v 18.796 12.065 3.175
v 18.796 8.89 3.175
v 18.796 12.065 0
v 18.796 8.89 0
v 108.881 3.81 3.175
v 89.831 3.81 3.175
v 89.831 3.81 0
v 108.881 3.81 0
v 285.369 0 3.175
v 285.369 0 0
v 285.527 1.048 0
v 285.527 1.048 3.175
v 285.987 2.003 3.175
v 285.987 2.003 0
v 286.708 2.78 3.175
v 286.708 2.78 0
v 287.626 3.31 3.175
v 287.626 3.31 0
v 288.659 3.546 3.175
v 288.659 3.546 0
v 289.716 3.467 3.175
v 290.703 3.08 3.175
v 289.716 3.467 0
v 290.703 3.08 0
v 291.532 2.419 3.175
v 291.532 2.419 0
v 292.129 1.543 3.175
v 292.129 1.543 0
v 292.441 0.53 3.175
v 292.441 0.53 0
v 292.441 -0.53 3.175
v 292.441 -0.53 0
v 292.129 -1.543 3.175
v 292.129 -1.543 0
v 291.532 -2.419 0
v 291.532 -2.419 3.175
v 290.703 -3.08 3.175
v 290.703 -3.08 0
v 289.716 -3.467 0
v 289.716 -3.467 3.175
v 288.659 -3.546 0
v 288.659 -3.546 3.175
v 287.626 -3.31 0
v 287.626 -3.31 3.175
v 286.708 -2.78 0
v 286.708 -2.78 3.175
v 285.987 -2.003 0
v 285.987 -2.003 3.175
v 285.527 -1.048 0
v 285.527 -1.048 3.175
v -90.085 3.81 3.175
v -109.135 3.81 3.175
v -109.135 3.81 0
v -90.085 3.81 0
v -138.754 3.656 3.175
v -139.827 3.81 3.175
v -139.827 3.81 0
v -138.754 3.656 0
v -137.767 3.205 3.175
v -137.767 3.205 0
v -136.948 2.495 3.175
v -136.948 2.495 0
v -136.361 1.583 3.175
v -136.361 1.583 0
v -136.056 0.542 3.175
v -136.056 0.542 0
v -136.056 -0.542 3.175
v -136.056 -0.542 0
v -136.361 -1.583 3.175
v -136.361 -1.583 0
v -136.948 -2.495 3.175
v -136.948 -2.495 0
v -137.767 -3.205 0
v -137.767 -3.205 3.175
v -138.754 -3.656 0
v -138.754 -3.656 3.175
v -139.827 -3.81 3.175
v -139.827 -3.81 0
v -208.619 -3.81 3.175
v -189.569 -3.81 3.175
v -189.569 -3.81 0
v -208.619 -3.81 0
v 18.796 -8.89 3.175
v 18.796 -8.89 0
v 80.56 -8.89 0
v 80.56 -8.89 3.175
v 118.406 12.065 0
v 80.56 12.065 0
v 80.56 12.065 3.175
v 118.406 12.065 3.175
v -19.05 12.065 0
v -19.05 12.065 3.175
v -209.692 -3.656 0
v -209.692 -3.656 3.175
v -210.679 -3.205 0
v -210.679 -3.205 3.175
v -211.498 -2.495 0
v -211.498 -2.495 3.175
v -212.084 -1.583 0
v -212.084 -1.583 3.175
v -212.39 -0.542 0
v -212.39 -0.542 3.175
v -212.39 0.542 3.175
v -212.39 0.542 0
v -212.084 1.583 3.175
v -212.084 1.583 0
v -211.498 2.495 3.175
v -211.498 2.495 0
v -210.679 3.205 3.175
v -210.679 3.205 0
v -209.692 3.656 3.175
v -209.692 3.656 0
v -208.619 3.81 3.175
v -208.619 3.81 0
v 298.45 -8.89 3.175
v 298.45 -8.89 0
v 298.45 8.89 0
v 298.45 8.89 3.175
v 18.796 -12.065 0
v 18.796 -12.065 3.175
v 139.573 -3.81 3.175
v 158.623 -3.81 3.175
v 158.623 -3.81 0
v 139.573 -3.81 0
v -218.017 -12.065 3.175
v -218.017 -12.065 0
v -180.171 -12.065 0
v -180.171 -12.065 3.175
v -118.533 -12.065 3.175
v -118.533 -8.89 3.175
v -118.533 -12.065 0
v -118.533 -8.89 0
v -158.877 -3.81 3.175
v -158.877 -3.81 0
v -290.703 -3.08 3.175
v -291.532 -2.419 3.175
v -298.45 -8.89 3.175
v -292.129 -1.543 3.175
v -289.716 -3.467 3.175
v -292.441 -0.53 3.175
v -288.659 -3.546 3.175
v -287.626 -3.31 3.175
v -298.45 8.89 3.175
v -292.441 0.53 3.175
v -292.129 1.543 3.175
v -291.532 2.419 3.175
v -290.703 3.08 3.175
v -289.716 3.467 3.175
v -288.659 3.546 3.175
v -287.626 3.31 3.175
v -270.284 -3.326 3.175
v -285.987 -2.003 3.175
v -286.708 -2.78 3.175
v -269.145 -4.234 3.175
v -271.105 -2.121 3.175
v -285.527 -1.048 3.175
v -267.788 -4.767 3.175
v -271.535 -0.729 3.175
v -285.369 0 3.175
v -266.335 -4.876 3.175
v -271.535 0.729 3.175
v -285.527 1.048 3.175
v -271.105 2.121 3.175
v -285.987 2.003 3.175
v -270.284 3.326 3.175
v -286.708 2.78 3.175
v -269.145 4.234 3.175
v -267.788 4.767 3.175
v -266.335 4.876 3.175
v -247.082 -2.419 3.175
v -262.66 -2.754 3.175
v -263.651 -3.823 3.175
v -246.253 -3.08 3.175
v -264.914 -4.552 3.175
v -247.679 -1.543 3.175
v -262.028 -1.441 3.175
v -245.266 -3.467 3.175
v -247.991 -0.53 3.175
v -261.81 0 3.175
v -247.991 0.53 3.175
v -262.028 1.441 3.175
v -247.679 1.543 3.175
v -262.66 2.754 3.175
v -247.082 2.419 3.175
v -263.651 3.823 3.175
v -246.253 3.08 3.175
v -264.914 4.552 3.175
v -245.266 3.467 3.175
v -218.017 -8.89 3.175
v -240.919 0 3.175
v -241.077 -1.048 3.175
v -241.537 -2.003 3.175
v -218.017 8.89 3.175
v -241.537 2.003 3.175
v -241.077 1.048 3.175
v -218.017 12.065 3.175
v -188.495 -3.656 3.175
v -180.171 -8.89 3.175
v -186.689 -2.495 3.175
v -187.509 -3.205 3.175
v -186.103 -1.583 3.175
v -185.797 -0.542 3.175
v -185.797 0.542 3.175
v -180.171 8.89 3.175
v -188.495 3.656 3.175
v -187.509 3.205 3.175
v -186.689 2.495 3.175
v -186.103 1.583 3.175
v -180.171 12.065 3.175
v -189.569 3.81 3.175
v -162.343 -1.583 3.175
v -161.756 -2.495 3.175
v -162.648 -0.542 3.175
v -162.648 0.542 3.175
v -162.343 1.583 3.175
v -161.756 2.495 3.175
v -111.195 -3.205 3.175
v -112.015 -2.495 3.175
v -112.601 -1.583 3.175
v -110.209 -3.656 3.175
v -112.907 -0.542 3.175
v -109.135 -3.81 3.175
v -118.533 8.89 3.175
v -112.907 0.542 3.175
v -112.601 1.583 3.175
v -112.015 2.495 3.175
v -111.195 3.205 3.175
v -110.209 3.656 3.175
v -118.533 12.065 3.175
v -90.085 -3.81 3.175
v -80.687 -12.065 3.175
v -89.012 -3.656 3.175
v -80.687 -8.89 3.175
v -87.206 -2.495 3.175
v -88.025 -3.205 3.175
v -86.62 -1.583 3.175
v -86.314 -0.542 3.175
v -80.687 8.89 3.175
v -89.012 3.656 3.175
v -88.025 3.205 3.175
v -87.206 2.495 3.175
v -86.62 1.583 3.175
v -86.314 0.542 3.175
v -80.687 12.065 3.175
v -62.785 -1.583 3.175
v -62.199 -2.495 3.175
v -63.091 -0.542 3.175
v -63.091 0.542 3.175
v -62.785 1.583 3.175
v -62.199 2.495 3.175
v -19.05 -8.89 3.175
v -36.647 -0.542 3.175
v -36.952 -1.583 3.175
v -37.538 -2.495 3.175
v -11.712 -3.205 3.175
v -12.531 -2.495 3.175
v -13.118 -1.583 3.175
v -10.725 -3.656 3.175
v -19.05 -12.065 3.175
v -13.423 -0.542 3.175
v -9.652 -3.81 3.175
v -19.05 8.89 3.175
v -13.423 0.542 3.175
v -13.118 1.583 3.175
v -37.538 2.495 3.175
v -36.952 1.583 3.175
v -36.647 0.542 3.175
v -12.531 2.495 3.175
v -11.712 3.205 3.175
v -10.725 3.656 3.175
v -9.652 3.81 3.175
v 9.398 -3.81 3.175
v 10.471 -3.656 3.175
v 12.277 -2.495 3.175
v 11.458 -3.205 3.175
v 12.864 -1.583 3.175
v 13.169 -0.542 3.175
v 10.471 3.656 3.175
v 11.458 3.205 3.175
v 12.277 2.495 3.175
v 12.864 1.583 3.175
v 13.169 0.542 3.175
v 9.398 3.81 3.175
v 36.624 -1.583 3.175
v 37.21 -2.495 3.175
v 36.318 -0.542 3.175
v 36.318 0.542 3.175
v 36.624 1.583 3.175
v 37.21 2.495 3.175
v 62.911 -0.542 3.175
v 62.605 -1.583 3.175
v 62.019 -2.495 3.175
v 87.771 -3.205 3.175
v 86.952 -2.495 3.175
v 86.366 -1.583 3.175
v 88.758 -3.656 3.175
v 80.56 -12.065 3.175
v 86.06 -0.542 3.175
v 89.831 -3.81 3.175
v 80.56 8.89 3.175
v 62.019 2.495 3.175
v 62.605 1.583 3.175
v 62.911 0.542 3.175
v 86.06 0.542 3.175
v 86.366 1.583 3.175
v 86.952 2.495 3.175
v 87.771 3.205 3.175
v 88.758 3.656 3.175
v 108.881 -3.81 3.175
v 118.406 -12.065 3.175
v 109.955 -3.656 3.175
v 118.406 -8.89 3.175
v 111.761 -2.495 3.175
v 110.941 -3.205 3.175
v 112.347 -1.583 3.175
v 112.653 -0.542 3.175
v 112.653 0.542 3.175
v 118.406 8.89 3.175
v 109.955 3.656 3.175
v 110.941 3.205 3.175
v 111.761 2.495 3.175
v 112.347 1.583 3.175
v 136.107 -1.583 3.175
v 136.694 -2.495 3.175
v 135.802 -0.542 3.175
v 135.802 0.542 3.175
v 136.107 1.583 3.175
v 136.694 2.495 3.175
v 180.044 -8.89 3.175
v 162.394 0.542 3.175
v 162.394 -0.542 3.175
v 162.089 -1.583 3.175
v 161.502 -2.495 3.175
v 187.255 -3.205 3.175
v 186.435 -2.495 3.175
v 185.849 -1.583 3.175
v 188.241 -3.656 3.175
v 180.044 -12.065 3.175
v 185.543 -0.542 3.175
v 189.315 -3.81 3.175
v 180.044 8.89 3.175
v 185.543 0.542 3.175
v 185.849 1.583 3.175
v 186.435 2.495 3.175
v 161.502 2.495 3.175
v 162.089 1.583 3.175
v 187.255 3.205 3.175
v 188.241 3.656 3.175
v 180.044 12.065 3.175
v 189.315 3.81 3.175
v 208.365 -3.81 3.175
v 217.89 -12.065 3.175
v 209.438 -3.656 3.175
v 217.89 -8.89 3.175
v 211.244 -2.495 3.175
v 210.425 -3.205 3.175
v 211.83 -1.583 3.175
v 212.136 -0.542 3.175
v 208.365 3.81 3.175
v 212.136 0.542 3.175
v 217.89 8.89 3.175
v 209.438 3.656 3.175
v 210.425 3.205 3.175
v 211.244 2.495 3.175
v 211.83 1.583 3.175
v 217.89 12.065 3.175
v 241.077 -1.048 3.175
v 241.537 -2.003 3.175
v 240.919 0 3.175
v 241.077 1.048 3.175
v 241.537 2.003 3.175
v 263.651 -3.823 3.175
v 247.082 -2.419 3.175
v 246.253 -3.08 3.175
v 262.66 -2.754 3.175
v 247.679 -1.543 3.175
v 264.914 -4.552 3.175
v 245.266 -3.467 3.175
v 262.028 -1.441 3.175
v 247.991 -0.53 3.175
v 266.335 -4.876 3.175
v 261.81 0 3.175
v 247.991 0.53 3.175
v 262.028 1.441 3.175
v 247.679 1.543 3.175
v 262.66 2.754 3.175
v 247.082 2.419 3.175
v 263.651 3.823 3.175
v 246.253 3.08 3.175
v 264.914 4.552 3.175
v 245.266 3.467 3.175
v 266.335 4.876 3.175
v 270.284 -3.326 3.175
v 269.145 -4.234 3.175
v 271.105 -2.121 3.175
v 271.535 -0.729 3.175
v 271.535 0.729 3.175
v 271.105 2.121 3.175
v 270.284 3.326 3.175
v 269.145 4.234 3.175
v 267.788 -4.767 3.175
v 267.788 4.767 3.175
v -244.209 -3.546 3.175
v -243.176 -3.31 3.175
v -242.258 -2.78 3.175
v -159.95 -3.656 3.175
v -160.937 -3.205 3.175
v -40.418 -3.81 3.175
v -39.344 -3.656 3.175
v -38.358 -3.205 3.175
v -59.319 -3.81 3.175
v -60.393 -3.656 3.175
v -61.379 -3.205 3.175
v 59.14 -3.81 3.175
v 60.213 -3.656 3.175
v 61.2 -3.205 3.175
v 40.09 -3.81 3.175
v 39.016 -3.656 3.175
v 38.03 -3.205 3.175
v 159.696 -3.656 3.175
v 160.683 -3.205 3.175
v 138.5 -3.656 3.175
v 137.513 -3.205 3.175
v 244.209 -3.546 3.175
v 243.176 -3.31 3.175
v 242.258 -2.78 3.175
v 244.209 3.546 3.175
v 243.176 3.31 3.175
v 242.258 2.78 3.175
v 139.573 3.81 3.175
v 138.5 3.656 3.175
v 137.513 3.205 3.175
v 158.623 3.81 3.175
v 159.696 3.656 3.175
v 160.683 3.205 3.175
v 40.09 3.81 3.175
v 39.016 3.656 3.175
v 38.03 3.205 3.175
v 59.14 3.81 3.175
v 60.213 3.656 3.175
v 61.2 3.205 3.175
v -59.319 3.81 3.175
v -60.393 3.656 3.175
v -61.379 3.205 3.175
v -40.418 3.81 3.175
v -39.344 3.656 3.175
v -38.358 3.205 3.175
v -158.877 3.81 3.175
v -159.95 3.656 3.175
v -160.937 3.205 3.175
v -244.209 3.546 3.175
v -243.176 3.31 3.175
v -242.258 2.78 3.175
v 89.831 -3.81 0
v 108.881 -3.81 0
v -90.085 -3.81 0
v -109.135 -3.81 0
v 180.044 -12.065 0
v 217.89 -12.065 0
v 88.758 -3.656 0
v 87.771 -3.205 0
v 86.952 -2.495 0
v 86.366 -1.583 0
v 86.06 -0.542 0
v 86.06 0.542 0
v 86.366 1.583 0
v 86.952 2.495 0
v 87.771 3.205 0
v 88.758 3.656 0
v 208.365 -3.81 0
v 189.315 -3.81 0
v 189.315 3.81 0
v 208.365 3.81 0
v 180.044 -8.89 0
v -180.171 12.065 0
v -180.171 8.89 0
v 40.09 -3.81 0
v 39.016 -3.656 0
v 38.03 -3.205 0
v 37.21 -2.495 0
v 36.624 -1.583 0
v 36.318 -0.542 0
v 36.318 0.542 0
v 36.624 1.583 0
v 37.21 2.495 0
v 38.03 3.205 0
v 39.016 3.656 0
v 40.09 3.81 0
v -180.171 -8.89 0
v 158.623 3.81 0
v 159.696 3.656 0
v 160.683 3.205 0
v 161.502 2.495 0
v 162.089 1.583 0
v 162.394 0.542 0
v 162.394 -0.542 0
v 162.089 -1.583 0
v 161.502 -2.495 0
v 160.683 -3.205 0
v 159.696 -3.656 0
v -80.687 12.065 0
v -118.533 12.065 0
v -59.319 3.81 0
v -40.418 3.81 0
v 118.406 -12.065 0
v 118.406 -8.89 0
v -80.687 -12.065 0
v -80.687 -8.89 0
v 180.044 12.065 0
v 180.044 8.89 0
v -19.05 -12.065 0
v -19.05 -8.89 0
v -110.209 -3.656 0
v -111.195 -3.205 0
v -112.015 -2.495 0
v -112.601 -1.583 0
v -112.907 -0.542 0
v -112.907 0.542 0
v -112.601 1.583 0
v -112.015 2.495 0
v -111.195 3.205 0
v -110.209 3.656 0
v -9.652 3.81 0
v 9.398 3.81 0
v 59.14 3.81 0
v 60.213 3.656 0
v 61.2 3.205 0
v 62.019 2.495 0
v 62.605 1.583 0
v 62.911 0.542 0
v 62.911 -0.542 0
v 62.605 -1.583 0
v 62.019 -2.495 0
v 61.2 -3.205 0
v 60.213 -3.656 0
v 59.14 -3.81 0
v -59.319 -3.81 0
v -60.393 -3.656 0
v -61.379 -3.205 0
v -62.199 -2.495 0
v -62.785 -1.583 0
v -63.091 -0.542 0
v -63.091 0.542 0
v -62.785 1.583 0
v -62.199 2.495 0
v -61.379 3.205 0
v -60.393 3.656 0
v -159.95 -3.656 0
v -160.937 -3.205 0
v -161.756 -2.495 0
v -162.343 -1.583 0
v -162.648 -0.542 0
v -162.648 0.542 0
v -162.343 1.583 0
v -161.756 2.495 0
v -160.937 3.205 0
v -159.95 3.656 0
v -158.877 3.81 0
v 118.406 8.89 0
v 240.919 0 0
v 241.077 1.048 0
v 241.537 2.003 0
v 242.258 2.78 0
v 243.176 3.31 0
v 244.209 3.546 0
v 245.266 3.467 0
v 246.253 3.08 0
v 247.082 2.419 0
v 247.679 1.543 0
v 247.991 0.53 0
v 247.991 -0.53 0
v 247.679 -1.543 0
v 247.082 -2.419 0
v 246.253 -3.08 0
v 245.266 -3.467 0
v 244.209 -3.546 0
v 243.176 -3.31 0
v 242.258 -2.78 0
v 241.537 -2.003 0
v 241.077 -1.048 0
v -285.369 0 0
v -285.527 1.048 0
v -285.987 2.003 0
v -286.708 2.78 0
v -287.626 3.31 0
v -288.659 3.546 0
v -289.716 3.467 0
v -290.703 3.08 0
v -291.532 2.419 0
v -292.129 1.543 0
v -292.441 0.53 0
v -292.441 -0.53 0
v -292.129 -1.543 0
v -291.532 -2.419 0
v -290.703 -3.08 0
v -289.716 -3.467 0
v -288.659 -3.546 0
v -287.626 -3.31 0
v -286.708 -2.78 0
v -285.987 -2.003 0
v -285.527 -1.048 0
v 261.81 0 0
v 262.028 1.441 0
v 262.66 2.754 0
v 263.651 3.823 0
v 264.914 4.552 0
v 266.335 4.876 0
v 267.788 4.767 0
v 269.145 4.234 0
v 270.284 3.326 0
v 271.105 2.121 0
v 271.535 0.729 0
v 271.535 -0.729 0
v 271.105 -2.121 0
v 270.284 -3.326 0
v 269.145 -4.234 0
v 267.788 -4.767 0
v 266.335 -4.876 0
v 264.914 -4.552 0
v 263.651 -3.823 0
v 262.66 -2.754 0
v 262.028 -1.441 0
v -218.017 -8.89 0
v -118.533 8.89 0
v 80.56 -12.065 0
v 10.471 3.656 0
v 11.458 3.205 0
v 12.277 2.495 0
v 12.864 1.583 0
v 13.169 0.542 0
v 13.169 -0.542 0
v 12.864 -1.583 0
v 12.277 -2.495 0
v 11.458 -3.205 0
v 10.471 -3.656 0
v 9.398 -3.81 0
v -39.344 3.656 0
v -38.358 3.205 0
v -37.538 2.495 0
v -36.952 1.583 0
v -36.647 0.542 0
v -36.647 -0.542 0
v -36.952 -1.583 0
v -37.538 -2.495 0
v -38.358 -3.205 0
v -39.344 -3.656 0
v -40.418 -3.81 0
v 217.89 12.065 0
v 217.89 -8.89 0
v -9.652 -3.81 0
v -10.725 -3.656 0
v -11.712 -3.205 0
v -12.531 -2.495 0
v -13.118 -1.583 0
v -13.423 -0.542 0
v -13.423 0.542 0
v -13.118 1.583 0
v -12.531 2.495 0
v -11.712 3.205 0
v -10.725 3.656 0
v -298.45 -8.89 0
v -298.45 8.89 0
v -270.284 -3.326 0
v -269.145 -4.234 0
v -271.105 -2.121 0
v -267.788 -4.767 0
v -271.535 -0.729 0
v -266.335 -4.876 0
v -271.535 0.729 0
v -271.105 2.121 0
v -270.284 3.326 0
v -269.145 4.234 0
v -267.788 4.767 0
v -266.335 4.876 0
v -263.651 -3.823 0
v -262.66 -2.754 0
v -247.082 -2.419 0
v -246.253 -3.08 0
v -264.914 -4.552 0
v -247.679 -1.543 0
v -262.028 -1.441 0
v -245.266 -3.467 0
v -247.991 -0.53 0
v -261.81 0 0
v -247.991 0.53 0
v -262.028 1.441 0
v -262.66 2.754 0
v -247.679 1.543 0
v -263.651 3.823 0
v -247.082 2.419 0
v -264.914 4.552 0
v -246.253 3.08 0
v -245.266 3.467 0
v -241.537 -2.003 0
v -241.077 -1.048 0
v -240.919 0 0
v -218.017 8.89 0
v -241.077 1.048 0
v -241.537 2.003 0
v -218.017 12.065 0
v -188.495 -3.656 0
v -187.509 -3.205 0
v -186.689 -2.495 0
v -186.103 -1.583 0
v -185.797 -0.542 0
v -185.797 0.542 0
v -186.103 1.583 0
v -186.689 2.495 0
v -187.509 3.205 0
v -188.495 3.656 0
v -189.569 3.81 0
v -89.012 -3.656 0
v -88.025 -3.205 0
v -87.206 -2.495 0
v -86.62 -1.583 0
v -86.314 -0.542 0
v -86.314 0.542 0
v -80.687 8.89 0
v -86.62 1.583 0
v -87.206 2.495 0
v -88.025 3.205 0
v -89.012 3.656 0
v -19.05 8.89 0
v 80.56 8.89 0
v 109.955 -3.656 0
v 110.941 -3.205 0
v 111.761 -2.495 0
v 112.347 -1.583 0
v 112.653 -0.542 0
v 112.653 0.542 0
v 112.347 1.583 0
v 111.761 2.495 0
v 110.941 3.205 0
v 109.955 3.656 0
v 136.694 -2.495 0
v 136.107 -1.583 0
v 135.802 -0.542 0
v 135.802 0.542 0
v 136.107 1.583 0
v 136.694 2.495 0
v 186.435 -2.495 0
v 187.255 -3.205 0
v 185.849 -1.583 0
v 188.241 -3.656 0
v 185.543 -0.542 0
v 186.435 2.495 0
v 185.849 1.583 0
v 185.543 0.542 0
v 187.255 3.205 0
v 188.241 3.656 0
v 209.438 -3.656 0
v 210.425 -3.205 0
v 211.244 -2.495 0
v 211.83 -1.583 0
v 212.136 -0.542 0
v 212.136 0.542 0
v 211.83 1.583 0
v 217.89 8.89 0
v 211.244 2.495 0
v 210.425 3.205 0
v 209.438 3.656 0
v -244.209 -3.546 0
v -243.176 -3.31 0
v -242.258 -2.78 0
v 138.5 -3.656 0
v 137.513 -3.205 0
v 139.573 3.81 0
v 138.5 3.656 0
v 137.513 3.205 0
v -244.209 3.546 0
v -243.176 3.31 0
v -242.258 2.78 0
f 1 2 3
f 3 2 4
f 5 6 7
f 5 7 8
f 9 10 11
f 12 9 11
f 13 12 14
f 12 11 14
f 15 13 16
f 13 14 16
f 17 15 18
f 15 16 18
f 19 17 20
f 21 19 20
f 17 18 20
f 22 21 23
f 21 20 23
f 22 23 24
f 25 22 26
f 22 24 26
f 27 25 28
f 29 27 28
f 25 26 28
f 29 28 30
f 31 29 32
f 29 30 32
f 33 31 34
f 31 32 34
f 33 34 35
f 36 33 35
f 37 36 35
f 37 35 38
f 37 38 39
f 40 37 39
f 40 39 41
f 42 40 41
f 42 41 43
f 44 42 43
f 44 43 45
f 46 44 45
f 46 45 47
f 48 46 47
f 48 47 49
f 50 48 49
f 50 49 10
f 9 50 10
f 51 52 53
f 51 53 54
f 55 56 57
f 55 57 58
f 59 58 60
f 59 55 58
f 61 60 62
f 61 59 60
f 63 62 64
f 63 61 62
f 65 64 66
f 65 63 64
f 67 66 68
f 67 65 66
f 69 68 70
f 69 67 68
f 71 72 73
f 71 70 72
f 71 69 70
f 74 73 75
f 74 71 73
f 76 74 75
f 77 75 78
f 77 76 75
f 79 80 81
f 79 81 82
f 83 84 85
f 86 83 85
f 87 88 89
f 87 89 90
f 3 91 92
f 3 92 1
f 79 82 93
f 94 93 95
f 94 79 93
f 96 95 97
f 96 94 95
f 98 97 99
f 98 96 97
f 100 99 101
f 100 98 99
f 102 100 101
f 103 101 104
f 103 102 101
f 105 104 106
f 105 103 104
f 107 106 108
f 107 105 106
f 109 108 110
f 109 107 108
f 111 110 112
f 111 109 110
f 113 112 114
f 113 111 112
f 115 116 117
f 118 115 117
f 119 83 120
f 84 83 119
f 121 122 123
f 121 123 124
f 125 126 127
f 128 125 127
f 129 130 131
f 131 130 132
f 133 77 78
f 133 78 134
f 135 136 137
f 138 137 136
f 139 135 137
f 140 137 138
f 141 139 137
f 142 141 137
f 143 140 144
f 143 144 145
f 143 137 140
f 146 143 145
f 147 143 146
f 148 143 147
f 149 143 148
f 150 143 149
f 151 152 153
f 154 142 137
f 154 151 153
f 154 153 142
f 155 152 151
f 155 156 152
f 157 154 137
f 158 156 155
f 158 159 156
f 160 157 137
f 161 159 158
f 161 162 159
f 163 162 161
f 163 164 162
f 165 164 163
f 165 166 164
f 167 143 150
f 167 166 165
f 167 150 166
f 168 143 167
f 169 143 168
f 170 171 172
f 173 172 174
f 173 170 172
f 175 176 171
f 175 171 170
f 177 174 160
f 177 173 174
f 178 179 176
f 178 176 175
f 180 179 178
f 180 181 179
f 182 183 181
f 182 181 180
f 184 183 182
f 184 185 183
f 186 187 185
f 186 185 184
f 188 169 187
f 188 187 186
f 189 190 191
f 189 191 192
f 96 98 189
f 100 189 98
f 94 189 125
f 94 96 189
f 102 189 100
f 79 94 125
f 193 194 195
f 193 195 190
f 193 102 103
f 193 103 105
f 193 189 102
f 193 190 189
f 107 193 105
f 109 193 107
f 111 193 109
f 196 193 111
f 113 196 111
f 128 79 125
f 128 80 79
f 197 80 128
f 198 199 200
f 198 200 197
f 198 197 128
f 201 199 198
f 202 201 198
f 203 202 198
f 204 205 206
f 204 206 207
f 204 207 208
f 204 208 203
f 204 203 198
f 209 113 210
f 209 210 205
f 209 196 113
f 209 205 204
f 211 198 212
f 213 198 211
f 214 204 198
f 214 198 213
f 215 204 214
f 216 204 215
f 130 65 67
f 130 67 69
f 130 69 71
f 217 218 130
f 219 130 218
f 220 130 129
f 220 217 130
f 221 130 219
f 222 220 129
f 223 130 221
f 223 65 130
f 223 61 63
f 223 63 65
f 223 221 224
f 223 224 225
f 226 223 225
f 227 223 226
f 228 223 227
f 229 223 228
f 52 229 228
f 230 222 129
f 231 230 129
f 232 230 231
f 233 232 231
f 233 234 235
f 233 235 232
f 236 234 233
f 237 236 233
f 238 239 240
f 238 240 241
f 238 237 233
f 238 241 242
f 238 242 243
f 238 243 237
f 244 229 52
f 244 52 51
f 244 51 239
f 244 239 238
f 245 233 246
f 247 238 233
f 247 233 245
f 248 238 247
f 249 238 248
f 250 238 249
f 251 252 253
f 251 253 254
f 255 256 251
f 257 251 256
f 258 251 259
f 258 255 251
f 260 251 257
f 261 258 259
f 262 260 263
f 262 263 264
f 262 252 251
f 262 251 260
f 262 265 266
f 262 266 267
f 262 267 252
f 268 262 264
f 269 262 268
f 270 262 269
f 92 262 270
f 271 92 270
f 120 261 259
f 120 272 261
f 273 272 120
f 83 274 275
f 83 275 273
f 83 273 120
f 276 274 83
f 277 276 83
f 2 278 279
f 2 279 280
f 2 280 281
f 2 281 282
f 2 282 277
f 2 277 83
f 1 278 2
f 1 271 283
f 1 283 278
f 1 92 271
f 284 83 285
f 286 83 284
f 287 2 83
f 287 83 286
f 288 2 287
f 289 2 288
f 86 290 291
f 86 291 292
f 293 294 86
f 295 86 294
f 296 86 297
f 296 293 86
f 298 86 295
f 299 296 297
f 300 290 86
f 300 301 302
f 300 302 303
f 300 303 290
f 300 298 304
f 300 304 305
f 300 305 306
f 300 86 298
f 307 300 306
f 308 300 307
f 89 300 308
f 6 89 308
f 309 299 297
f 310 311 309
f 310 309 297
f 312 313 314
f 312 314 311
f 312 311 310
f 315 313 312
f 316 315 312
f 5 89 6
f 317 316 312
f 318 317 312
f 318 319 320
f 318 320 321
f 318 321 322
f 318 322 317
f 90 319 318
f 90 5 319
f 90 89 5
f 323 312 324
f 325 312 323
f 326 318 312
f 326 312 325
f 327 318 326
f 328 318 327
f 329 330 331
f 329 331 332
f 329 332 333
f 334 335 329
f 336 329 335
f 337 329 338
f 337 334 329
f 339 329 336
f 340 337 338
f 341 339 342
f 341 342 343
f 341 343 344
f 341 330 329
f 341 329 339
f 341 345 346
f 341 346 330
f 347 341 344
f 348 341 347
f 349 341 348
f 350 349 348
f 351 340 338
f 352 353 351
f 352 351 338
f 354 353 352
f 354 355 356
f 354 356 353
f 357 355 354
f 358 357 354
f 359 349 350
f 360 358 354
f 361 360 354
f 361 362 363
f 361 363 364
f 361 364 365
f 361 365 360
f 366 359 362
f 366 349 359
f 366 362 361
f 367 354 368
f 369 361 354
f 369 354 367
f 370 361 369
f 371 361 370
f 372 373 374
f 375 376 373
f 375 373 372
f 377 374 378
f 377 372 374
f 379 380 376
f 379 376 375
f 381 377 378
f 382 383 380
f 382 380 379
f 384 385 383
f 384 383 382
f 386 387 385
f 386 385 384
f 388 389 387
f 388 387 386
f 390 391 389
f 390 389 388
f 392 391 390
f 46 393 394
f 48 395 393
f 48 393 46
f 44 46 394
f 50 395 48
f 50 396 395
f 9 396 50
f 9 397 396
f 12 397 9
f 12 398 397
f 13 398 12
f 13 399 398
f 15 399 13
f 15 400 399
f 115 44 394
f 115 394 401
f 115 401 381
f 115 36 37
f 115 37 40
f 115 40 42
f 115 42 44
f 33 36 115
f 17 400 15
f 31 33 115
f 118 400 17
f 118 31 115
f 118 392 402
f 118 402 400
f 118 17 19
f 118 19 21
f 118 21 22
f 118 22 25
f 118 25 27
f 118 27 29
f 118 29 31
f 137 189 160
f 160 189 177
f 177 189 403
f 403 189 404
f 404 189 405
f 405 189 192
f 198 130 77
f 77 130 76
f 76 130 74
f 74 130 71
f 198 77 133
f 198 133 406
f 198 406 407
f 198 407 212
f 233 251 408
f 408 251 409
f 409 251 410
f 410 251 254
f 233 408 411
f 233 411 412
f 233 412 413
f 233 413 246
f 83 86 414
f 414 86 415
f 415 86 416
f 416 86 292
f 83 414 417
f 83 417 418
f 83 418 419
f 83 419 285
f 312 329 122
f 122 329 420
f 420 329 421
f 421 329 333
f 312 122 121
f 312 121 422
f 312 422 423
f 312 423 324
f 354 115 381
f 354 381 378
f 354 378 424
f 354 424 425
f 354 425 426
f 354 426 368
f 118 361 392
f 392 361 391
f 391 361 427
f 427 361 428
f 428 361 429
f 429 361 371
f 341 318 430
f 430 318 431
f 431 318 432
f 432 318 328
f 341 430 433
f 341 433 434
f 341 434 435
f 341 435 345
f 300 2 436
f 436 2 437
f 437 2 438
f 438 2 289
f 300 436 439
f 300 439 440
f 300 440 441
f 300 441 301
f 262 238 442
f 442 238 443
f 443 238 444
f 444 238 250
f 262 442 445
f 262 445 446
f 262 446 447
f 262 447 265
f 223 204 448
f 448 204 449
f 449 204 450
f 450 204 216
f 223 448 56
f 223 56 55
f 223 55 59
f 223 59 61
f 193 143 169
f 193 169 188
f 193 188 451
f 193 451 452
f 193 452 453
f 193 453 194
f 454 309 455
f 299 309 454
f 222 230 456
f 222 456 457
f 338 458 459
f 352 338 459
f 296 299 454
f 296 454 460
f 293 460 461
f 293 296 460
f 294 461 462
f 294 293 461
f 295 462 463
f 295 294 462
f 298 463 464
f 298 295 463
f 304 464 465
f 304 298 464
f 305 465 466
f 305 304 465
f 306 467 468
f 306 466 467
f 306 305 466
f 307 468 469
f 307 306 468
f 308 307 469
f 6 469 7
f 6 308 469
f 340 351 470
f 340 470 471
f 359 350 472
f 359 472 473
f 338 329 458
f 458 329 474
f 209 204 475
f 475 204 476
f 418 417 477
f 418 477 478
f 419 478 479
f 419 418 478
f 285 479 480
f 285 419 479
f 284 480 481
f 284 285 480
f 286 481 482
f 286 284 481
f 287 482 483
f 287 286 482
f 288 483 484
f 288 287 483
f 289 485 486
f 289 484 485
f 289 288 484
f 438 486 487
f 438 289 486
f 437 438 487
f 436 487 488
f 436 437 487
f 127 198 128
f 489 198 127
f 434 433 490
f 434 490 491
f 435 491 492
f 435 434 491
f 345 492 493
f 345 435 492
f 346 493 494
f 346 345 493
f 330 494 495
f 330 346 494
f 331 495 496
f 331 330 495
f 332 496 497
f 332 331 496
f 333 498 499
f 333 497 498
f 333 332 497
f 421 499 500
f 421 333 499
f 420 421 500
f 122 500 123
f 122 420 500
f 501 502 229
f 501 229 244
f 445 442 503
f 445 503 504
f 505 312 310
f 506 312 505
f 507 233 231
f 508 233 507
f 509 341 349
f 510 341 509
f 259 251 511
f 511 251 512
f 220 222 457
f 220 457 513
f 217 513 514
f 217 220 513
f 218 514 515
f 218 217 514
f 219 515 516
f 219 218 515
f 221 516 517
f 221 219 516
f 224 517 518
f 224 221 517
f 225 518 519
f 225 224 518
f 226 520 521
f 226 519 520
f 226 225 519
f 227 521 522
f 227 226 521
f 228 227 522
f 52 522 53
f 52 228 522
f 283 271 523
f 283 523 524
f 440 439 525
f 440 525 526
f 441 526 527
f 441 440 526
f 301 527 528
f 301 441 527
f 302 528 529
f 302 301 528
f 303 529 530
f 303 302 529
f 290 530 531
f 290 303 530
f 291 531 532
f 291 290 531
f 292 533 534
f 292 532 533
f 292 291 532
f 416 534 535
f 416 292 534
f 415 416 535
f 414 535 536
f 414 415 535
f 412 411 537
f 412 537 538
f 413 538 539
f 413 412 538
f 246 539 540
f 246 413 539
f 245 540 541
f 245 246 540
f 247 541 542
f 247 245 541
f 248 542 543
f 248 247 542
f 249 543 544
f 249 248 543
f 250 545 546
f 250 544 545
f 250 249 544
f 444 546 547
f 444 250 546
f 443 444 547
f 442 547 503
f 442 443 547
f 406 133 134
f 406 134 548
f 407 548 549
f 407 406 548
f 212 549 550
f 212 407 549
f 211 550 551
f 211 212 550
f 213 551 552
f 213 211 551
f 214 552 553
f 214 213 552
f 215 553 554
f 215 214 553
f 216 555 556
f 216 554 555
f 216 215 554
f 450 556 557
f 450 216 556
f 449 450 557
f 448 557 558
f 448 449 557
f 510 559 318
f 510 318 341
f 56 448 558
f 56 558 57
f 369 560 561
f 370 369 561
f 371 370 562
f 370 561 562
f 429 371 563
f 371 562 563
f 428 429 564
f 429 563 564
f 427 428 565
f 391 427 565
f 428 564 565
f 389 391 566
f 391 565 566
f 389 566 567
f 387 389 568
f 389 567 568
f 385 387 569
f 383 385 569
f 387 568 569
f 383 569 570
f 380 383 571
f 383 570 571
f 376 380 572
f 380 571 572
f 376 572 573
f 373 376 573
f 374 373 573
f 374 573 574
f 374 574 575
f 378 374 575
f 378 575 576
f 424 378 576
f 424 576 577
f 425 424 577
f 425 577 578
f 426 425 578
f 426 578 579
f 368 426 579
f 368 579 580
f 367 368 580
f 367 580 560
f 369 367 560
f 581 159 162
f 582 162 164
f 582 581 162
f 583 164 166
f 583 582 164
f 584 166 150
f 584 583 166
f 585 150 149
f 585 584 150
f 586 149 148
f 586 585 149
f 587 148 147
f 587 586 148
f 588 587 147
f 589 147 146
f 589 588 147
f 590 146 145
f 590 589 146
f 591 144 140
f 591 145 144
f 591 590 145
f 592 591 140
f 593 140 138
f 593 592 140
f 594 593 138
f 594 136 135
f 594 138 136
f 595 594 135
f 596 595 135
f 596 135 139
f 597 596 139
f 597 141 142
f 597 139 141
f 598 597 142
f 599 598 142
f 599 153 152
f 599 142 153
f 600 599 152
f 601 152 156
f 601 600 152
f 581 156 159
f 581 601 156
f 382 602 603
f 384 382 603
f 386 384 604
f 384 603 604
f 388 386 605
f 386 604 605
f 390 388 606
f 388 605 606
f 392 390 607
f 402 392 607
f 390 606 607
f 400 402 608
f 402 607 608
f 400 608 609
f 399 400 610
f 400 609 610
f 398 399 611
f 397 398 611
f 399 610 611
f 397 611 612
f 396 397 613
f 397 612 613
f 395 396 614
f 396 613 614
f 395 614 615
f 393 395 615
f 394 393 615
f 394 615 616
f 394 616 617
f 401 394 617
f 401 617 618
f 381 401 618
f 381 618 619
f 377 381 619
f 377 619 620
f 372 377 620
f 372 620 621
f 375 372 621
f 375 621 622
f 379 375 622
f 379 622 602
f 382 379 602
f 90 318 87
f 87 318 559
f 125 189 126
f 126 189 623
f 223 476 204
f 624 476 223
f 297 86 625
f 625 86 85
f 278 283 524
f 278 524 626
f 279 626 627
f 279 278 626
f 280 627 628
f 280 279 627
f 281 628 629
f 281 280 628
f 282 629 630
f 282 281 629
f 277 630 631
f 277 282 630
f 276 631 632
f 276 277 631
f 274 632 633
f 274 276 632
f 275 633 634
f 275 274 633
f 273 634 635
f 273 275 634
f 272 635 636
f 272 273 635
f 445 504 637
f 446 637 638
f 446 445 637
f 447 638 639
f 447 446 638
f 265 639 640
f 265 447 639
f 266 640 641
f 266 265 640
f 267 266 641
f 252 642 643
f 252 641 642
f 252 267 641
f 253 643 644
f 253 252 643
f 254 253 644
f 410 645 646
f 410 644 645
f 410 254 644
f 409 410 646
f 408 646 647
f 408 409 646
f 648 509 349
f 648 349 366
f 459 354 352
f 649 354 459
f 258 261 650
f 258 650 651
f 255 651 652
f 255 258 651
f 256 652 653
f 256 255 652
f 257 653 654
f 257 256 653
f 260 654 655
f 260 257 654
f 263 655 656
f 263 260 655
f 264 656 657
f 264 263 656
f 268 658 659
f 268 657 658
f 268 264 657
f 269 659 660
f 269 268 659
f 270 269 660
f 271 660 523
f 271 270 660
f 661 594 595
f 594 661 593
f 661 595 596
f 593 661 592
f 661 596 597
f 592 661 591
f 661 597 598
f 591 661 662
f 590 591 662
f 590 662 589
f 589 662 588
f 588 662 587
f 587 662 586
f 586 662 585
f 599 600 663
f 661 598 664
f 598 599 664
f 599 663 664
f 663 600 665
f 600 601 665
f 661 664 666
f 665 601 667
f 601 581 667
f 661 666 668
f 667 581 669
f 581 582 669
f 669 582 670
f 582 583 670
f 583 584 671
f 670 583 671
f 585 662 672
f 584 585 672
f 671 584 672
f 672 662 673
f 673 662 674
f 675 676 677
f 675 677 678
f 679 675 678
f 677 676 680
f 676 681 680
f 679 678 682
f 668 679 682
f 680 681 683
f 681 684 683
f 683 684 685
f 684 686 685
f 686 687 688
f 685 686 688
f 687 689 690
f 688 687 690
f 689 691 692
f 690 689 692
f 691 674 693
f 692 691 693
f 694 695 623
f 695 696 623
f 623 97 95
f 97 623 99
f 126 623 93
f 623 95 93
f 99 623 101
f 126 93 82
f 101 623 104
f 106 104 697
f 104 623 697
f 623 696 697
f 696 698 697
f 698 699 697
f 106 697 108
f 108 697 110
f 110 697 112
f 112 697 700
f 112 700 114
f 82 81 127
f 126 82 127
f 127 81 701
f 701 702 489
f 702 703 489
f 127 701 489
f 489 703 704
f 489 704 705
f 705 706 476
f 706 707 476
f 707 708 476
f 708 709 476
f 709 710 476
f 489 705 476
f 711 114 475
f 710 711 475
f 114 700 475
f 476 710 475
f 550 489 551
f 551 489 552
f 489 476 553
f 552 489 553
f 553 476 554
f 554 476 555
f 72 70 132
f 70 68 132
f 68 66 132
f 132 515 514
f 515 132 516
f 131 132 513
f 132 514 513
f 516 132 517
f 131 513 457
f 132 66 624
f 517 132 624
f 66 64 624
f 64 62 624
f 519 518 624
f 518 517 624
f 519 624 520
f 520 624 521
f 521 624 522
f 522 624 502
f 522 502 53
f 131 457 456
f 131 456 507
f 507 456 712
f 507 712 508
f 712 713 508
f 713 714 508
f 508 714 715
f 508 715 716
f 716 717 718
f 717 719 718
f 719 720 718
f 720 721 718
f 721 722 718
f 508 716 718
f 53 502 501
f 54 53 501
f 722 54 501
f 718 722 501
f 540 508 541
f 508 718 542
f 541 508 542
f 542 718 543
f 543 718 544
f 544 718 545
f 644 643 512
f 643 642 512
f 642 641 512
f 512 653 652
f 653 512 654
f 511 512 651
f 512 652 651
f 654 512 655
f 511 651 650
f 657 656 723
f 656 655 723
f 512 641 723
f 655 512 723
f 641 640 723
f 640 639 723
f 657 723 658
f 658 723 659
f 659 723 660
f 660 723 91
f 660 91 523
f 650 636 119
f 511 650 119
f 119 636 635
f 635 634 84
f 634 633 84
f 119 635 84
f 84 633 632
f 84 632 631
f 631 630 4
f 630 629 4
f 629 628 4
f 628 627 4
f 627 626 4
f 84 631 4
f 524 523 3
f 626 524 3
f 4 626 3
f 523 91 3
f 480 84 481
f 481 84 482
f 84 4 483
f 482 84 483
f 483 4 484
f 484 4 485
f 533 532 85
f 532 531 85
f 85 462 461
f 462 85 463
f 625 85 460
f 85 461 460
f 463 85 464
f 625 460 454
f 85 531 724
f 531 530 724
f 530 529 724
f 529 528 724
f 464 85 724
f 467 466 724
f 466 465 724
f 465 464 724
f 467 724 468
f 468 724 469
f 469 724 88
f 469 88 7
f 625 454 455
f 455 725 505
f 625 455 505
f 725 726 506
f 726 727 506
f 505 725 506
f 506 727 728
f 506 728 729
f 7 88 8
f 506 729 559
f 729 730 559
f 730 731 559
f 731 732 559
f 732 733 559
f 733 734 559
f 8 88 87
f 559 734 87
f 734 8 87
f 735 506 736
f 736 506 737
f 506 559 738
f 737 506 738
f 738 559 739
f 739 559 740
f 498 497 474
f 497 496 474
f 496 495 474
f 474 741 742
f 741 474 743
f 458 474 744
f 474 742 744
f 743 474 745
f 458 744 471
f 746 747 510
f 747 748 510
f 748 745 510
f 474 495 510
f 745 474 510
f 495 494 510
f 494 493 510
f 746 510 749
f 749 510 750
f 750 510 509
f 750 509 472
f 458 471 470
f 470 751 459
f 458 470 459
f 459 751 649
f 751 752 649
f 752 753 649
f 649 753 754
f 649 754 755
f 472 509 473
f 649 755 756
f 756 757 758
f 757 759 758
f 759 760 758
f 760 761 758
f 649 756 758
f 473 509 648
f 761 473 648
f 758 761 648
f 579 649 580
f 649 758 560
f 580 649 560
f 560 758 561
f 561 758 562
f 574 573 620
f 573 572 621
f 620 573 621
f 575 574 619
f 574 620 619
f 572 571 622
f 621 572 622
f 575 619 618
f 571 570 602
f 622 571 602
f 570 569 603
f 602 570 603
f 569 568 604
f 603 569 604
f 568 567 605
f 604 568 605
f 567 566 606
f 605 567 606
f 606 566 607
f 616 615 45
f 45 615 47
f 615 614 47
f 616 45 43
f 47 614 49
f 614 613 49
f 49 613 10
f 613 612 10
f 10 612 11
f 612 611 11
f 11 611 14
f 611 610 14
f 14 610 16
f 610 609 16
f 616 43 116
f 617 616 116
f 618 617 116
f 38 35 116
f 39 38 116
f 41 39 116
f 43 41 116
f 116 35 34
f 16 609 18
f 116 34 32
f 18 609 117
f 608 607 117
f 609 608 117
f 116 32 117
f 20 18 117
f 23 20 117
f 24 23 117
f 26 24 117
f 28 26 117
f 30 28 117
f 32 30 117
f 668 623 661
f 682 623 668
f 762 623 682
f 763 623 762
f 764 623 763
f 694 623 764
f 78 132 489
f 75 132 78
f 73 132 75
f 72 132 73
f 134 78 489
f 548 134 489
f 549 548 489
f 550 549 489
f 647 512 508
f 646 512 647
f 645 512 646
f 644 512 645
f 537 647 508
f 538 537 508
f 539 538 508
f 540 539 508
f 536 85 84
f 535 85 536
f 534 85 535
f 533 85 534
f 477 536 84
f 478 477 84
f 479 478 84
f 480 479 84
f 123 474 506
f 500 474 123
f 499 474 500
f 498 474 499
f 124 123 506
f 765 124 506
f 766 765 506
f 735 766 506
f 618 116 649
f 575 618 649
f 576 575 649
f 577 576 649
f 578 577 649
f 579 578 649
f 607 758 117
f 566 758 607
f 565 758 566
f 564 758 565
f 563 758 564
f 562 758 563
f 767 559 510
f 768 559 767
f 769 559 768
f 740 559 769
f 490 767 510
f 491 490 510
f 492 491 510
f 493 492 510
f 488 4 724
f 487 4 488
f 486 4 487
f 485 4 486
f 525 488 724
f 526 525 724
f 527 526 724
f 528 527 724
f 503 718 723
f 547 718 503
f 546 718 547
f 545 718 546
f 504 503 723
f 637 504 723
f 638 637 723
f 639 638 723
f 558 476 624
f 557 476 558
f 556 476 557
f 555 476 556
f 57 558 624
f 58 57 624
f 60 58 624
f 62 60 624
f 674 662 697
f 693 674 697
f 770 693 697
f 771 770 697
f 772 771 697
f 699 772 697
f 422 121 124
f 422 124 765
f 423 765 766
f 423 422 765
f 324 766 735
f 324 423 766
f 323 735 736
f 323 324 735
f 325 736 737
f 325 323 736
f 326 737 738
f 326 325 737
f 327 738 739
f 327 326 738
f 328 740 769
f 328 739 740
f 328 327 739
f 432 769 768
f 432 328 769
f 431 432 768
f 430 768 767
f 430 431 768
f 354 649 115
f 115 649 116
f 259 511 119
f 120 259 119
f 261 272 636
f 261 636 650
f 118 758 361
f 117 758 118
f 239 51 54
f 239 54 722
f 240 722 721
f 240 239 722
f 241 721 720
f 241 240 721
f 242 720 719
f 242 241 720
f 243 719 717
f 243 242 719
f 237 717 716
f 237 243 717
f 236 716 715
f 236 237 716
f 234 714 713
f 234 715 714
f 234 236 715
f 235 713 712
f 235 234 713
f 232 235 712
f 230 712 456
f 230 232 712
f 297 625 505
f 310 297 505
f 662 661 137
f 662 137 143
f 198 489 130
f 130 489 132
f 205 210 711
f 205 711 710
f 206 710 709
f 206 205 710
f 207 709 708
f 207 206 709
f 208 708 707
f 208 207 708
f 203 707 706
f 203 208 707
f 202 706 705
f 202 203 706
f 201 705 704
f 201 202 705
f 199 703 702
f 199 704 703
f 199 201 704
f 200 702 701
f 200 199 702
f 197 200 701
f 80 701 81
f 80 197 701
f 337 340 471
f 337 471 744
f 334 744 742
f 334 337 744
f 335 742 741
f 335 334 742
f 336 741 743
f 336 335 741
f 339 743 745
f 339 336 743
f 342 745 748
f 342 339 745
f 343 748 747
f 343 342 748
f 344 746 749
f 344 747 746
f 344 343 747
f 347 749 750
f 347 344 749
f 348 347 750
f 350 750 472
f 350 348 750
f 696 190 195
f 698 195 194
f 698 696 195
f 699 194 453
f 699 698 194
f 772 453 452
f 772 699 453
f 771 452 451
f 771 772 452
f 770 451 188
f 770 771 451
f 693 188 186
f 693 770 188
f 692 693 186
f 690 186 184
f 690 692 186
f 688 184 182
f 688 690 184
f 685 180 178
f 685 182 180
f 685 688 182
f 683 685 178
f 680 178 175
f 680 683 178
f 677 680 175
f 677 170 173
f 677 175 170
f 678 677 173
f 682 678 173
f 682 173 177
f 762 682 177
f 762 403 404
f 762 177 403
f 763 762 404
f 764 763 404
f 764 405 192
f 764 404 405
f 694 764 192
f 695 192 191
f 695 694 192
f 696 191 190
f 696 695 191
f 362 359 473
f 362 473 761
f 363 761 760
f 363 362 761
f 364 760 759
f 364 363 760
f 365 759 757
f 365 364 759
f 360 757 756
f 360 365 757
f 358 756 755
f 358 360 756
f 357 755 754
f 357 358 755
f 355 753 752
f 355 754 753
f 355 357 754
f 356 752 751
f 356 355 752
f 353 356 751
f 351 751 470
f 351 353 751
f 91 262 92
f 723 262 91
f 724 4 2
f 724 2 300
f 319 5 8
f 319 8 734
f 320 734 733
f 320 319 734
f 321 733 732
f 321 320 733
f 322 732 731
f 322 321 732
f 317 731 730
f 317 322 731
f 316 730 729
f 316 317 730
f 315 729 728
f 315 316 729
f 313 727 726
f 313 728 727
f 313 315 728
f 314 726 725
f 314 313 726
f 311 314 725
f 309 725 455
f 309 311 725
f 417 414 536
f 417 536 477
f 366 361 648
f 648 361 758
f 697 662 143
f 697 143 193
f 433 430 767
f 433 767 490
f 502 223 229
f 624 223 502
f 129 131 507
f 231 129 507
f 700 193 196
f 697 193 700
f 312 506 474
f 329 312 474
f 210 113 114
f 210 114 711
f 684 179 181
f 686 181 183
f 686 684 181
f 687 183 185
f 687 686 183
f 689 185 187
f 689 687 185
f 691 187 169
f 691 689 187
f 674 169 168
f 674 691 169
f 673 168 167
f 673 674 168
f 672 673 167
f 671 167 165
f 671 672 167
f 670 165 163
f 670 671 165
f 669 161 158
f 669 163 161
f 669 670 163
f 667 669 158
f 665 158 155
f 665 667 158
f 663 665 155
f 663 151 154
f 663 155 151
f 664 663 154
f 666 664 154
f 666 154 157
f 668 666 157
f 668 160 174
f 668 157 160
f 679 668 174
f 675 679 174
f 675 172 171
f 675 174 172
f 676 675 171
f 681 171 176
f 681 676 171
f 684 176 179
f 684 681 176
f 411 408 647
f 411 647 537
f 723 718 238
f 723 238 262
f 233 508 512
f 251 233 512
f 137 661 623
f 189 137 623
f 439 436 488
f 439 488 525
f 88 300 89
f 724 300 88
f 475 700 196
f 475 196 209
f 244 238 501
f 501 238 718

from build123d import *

# Parameters (mm, degrees)
SKETCH1_W           = 596.9
SKETCH1_H           = 17.78
BOSS_EXTRUDE1_DEPTH = 3.175
SKETCH3_W           = 37.846
SKETCH3_H           = 3.175
BOSS_EXTRUDE2_DEPTH = 3.175
SKETCH4_R           = 3.556
SKETCH4_R_2         = 4.8895
CUT_EXTRUDE1_DEPTH  = 299.710641508
CUT_EXTRUDE3_DEPTH  = 299.710641508


with BuildPart() as part:
    # Sketch1 → Boss-Extrude1 (new body)
    with BuildSketch(Plane.XY):
        Rectangle(SKETCH1_W, SKETCH1_H)
    extrude(amount=BOSS_EXTRUDE1_DEPTH)

    # Sketch3 → Boss-Extrude2 (add)
    with BuildSketch(Plane(origin=(0, 8.89, 0), x_dir=(1, 0, 0), z_dir=(0, 1, 0))):
        with Locations((-199.093666667, -1.5875)):
            Rectangle(SKETCH3_W, SKETCH3_H)
        with Locations((-99.610333333, -1.5875)):
            Rectangle(SKETCH3_W, SKETCH3_H)
        with Locations((-0.127, -1.5875)):
            Rectangle(SKETCH3_W, SKETCH3_H)
        with Locations((99.483333333, -1.5875)):
            Rectangle(SKETCH3_W, SKETCH3_H)
        with Locations((198.966666751, -1.5875)):
            Rectangle(SKETCH3_W, SKETCH3_H)
    boss_extrude2 = extrude(amount=BOSS_EXTRUDE2_DEPTH)

    # Mirror1: Boss-Extrude2 across plane
    add(boss_extrude2.mirror(Plane.ZX))

    # Sketch4 → Cut-Extrude1 (cut, through all)
    with BuildSketch(Plane(origin=(0, 0, 0), x_dir=(-1, 0, 0), z_dir=(0, 0, -1))):
        with Locations((-288.925, 0)):
            Circle(SKETCH4_R)
        with Locations((-244.475, 0)):
            Circle(SKETCH4_R)
        with Locations((-266.7, 0)):
            Circle(SKETCH4_R_2)
    cut_extrude1 = extrude(amount=-CUT_EXTRUDE1_DEPTH, mode=Mode.SUBTRACT)

    # Mirror2: Cut-Extrude1 across plane
    add(cut_extrude1.mirror(Plane(origin=(0, 0, 0), x_dir=(0, 0, 1), z_dir=(1, 0, 0))), mode=Mode.SUBTRACT)

    # Sketch6 → Cut-Extrude3 (cut, through all)
    with BuildSketch(Plane.XY.offset(3.175)):
        with BuildLine():
            Line((-208.618666667, 3.81), (-189.568666667, 3.81))
            ThreePointArc((-189.568666667, 3.81), (-185.758666667, 0), (-189.568666667, -3.81))
            Line((-189.568666667, -3.81), (-208.618666667, -3.81))
            ThreePointArc((-208.618666667, -3.81), (-212.428666667, 0), (-208.618666667, 3.81))
        make_face()
        with BuildLine():
            Line((-109.135333333, 3.81), (-90.085333333, 3.81))
            ThreePointArc((-90.085333333, 3.81), (-86.275333333, 0), (-90.085333333, -3.81))
            Line((-90.085333333, -3.81), (-109.135333333, -3.81))
            ThreePointArc((-109.135333333, -3.81), (-112.945333333, 0), (-109.135333333, 3.81))
        make_face()
        with BuildLine():
            Line((-9.652, 3.81), (9.398, 3.81))
            ThreePointArc((9.398, 3.81), (13.208, 0), (9.398, -3.81))
            Line((9.398, -3.81), (-9.652, -3.81))
            ThreePointArc((-9.652, -3.81), (-13.462, 0), (-9.652, 3.81))
        make_face()
        with BuildLine():
            Line((89.831333333, 3.81), (108.881333333, 3.81))
            ThreePointArc((108.881333333, 3.81), (112.691333333, 0), (108.881333333, -3.81))
            Line((108.881333333, -3.81), (89.831333333, -3.81))
            ThreePointArc((89.831333333, -3.81), (86.021333333, 0), (89.831333333, 3.81))
        make_face()
        with BuildLine():
            Line((189.314666667, 3.81), (208.364666667, 3.81))
            ThreePointArc((208.364666667, 3.81), (212.174666667, 0), (208.364666667, -3.81))
            Line((208.364666667, -3.81), (189.314666667, -3.81))
            ThreePointArc((189.314666667, -3.81), (185.504666667, 0), (189.314666667, 3.81))
        make_face()
        with BuildLine():
            Line((-158.877, 3.81), (-139.827, 3.81))
            ThreePointArc((-139.827, 3.81), (-136.017, 0), (-139.827, -3.81))
            Line((-139.827, -3.81), (-158.877, -3.81))
            ThreePointArc((-158.877, -3.81), (-162.687, 0), (-158.877, 3.81))
        make_face()
        with BuildLine():
            Line((-59.319456458, 3.81), (-40.417876875, 3.81))
            ThreePointArc((-40.417876875, 3.81), (-36.607876875, 0), (-40.417876875, -3.81))
            Line((-40.417876875, -3.81), (-59.319456458, -3.81))
            ThreePointArc((-59.319456458, -3.81), (-63.129456458, 0), (-59.319456458, 3.81))
        make_face()
        with BuildLine():
            Line((40.089666667, 3.81), (59.139666667, 3.81))
            ThreePointArc((59.139666667, 3.81), (62.949666667, 0), (59.139666667, -3.81))
            Line((59.139666667, -3.81), (40.089666667, -3.81))
            ThreePointArc((40.089666667, -3.81), (36.279666667, 0), (40.089666667, 3.81))
        make_face()
        with BuildLine():
            Line((139.573, 3.81), (158.623, 3.81))
            ThreePointArc((158.623, 3.81), (162.433, 0), (158.623, -3.81))
            Line((158.623, -3.81), (139.573, -3.81))
            ThreePointArc((139.573, -3.81), (135.763, 0), (139.573, 3.81))
        make_face()
    extrude(amount=-CUT_EXTRUDE3_DEPTH, mode=Mode.SUBTRACT)


solid = part.part
